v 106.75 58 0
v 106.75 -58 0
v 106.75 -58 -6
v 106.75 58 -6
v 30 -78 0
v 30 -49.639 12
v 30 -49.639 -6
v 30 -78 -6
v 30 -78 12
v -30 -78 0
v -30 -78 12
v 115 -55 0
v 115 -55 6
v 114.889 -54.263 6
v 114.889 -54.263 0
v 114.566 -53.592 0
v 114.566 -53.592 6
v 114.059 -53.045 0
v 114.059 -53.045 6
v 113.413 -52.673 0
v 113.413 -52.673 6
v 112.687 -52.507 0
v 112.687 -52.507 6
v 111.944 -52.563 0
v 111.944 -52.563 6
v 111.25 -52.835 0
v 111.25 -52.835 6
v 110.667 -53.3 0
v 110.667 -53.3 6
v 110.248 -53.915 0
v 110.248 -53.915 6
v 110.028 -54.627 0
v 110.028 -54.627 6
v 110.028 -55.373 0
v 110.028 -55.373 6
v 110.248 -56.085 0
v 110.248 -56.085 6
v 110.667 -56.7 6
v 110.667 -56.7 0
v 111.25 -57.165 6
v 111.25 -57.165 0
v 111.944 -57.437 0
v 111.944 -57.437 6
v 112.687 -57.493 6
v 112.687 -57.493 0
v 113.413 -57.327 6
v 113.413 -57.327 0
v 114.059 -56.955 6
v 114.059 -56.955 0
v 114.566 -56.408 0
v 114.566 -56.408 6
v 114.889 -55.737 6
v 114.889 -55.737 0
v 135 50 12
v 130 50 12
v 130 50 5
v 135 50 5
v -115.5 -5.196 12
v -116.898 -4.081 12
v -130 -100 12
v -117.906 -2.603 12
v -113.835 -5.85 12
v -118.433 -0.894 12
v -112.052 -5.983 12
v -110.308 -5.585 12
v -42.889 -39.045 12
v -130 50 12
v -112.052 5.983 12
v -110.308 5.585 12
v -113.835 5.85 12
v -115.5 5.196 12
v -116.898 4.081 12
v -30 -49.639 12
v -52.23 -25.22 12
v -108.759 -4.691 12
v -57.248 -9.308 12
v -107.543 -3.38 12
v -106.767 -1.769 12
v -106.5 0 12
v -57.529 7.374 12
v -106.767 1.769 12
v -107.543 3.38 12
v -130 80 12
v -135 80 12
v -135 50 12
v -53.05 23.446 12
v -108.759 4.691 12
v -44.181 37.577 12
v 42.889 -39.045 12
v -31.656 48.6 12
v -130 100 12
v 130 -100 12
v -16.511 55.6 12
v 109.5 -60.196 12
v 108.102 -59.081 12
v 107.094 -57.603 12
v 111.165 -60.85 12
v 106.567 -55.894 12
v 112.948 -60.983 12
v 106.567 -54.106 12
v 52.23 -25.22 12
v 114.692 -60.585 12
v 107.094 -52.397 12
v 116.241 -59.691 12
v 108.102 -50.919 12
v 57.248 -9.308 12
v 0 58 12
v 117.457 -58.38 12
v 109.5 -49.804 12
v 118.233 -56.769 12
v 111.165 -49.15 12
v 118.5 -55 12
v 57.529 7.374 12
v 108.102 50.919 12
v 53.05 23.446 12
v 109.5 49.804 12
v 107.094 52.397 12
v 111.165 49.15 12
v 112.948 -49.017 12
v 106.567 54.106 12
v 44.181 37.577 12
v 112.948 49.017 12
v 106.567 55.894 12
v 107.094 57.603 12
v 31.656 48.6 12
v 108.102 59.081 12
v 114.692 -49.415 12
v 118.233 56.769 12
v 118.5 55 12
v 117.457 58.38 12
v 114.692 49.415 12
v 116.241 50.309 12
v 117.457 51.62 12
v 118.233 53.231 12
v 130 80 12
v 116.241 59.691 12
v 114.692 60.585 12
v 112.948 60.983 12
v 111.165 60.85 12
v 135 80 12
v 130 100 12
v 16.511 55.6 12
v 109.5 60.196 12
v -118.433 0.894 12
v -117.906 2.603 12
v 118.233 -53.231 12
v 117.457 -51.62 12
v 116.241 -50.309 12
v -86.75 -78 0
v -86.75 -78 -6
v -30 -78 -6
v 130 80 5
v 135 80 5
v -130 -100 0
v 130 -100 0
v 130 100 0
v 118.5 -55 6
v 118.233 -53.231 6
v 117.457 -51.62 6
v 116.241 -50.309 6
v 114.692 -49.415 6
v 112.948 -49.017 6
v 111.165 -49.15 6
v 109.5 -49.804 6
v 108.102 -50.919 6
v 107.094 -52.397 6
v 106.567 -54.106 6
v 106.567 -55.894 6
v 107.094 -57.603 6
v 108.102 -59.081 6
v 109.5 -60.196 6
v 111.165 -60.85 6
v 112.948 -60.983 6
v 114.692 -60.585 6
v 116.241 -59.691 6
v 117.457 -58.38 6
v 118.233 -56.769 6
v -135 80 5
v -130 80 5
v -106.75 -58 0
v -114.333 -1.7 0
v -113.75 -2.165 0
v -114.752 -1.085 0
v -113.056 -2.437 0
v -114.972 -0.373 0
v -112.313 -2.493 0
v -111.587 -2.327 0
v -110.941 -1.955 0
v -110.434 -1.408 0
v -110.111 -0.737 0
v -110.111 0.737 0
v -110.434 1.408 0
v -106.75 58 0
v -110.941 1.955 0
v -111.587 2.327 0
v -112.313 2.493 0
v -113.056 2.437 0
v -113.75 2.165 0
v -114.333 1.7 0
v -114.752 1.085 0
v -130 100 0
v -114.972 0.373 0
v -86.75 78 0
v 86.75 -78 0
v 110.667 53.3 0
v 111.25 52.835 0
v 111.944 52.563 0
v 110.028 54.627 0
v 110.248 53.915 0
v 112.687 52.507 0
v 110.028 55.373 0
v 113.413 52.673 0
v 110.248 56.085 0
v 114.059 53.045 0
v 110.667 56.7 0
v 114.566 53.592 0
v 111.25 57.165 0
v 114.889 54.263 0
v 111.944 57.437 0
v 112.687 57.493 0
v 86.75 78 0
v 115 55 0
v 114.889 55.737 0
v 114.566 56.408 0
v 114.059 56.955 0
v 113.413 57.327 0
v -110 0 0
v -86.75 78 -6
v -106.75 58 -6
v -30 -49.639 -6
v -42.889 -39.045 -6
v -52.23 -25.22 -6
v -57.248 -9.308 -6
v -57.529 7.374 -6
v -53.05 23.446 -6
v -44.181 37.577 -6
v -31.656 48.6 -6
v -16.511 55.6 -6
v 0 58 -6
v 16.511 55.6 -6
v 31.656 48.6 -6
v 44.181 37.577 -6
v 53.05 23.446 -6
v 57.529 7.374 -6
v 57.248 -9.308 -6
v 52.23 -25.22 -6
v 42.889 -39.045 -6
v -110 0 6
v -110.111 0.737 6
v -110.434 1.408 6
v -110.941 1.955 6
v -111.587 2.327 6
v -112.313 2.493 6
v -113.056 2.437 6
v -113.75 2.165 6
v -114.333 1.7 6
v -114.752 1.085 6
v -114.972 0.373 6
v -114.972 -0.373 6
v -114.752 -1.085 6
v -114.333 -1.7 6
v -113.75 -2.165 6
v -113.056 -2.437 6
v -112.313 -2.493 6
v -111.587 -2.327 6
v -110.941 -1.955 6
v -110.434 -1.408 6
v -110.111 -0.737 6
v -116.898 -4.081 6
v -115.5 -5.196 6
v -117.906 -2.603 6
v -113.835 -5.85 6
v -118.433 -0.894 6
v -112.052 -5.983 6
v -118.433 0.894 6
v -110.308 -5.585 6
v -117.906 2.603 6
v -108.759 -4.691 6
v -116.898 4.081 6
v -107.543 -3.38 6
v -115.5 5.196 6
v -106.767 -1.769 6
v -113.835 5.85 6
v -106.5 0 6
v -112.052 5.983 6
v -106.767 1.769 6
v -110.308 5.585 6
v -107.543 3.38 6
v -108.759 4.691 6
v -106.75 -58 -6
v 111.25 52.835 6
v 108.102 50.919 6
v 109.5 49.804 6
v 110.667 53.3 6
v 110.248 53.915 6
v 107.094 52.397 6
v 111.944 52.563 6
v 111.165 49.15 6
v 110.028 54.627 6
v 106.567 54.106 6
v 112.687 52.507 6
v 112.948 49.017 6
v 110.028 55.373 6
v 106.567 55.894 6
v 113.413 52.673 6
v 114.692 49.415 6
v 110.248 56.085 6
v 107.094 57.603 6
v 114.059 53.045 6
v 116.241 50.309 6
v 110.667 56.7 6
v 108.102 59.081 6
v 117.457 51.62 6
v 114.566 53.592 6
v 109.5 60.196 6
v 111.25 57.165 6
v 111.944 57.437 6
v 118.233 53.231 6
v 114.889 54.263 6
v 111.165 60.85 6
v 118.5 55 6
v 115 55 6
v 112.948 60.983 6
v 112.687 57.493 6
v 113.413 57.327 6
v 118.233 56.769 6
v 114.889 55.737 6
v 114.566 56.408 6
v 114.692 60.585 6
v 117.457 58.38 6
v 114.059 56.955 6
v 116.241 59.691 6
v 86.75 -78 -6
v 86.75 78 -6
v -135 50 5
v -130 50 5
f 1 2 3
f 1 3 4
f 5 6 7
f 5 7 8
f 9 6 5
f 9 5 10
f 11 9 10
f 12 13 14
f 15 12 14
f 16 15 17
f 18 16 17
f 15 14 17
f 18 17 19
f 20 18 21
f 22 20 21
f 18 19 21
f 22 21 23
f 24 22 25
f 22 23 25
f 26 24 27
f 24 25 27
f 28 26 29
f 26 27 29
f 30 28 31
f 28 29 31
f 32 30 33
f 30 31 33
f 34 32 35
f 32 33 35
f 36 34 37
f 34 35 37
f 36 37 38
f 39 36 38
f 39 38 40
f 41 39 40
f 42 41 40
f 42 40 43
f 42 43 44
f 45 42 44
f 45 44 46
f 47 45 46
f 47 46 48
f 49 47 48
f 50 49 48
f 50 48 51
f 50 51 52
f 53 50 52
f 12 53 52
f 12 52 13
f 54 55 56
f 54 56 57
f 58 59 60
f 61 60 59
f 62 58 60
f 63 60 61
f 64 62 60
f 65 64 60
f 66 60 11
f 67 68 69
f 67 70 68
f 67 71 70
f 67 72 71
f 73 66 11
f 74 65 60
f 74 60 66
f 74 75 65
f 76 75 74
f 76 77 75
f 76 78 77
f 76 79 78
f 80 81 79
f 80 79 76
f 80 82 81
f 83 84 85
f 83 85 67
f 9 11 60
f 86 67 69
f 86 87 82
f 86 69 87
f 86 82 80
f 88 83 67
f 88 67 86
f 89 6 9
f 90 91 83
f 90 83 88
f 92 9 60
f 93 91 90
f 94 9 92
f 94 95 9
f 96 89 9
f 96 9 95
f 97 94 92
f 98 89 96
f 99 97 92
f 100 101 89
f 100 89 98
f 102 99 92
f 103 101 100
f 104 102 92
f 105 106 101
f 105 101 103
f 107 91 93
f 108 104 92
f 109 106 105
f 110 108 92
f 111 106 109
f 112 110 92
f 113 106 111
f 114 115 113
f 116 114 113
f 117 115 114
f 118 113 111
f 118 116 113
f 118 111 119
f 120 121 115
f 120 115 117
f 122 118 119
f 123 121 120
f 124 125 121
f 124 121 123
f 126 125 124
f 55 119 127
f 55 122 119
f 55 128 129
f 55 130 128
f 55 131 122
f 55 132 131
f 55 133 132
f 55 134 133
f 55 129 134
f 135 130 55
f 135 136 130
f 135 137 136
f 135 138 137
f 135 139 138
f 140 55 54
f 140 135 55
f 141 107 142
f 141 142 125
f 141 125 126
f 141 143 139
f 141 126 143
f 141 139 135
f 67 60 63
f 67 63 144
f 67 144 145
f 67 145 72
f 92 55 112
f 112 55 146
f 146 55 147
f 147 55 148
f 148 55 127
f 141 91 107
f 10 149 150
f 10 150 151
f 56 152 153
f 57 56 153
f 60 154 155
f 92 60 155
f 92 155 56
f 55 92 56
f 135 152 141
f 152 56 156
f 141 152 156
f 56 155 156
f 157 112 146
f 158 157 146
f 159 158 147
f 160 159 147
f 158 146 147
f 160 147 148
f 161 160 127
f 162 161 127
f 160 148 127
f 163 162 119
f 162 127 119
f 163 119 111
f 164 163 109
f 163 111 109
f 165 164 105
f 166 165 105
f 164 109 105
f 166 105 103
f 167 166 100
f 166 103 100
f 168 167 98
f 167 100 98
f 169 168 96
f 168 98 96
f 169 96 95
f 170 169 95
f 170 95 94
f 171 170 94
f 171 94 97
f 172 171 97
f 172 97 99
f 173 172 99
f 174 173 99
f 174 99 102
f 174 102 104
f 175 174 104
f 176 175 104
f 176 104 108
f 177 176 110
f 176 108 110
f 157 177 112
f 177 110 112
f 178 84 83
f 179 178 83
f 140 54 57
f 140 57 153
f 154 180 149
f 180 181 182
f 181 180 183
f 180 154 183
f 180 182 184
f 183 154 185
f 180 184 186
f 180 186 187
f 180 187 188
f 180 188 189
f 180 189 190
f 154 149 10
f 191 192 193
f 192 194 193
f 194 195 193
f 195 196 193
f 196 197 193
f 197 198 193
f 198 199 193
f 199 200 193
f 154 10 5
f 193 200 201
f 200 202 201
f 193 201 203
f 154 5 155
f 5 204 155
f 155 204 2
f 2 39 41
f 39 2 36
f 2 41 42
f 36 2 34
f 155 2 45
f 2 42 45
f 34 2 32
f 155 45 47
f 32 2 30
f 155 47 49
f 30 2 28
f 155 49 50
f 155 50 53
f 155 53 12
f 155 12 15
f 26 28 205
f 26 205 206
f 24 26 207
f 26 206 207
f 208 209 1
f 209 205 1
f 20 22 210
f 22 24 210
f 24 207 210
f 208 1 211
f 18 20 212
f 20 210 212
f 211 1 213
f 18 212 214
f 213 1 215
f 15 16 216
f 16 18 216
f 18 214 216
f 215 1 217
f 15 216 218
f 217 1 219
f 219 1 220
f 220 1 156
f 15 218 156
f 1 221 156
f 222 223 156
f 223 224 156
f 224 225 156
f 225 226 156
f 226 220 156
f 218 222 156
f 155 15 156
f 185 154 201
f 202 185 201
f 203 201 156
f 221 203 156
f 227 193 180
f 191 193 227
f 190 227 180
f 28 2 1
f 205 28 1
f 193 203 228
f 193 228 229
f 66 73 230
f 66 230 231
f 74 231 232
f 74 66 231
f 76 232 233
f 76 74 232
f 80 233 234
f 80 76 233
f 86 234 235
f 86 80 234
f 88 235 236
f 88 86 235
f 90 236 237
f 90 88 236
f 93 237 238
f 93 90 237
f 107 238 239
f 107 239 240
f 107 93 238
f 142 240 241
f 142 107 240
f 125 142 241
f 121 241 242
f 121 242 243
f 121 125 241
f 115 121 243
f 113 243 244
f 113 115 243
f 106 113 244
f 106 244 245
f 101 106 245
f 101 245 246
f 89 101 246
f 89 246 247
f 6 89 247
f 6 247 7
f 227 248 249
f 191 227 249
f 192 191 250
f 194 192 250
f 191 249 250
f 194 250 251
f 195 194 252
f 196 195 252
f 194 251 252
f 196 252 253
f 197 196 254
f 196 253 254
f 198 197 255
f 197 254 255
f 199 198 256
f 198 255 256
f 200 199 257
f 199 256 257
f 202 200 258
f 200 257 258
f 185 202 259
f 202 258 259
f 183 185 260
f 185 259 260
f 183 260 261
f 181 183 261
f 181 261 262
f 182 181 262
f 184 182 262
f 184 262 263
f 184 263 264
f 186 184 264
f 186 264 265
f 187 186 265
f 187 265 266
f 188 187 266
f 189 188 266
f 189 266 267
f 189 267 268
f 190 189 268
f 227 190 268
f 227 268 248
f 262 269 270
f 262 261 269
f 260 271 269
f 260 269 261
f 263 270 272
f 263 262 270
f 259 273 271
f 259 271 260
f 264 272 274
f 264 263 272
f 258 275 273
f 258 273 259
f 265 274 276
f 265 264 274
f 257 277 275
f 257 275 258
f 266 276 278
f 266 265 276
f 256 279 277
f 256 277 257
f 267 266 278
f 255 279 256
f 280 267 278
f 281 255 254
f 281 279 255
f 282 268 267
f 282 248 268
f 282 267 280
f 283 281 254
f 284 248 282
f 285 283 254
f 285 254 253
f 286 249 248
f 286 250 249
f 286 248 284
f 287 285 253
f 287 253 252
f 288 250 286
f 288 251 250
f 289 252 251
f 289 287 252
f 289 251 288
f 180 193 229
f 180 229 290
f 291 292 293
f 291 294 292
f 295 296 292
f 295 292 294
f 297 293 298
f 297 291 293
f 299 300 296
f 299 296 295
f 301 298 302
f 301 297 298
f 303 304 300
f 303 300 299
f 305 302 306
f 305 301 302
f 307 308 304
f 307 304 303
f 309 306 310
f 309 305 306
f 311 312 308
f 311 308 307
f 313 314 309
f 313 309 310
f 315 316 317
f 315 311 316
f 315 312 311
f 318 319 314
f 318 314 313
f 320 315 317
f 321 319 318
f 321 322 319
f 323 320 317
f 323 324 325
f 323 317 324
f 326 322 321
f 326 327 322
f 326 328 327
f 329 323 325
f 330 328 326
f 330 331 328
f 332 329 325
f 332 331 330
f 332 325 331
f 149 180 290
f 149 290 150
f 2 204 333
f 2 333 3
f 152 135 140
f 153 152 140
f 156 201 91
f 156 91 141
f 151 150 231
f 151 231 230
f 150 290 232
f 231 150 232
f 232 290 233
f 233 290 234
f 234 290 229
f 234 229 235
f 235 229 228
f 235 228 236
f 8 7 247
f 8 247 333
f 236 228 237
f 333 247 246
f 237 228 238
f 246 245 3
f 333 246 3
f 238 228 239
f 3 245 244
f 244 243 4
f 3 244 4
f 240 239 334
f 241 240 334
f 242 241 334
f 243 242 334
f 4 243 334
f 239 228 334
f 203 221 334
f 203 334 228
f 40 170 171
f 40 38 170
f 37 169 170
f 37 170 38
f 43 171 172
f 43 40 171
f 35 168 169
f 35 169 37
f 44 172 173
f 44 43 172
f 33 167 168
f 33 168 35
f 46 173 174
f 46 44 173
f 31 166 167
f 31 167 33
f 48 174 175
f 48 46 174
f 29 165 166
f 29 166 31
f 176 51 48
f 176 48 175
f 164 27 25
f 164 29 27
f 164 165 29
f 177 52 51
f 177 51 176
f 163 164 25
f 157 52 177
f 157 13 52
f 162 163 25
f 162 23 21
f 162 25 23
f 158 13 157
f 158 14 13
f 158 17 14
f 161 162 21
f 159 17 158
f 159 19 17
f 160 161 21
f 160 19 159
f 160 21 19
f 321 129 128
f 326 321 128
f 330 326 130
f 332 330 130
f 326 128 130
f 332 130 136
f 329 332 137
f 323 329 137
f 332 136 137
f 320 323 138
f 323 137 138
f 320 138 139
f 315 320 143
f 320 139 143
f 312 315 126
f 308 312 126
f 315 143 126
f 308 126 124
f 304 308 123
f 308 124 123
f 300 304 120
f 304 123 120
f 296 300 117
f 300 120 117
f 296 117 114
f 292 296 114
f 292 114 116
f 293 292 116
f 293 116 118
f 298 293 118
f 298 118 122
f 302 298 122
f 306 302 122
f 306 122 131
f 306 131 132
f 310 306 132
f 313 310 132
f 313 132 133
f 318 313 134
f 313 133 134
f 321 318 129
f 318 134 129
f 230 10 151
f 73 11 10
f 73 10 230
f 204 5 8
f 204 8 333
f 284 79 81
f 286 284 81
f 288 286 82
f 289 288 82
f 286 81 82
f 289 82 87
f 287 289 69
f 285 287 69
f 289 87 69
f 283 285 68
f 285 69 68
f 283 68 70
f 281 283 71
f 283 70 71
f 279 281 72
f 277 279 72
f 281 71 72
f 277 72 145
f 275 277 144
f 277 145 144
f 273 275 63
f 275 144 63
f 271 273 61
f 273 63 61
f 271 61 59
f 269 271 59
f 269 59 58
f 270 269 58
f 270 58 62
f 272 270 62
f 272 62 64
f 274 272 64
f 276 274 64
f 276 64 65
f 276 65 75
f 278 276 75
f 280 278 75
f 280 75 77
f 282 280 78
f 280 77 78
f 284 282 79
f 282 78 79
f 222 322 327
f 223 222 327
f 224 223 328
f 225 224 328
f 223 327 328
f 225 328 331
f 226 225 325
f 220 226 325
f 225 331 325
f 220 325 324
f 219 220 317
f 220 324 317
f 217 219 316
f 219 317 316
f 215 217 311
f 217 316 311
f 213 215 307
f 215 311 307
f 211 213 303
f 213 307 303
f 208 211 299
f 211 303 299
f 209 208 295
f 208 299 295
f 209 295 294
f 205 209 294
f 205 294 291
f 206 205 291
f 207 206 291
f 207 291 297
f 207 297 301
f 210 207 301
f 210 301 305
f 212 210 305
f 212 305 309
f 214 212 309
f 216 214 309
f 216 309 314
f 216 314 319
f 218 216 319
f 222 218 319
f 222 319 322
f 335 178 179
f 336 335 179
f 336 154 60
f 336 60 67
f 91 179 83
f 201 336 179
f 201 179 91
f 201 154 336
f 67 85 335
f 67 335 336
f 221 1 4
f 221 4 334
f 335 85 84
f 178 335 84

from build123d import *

# Parameters (mm, degrees)
F0_W     = 260
F0_H     = 200
F1_DEPTH = 12
F2_DEPTH = 6
F3_W     = 5
F3_H     = 30
F4_DEPTH = 7
F5_R     = 6
F5_R_2   = 2.5
F6_DEPTH = 6
F7_DEPTH = 18.001


with BuildPart() as f1:
    # F0 (on Top) → F1 (new body)
    with BuildSketch(Plane.XY):
        Rectangle(F0_W, F0_H)
        Polygon((-86.75, 78), (86.75, 78), (106.75, 58), (106.75, -58), (86.75, -78), (30, -78), (-30, -78), (-86.75, -78), (-106.75, -58), (-106.75, 58), align=None, mode=Mode.SUBTRACT)
        with BuildLine():
            Line((106.75, 58), (86.75, 78))
            Line((86.75, 78), (-86.75, 78))
            Line((-86.75, 78), (-106.75, 58))
            Line((-106.75, 58), (-106.75, -58))
            Line((-106.75, -58), (-86.75, -78))
            Line((-86.75, -78), (-30, -78))
            Line((-30, -78), (-30, -49.638695))
            ThreePointArc((-30, -49.638695), (0, 58), (30, -49.638695))
            Line((30, -49.638695), (30, -78))
            Line((30, -78), (86.75, -78))
            Line((86.75, -78), (106.75, -58))
            Line((106.75, -58), (106.75, 58))
        make_face()
    extrude(amount=F1_DEPTH)

    # F0 (on Top) → F2 (join)
    with BuildSketch(Plane.XY):
        with BuildLine():
            Line((106.75, 58), (86.75, 78))
            Line((86.75, 78), (-86.75, 78))
            Line((-86.75, 78), (-106.75, 58))
            Line((-106.75, 58), (-106.75, -58))
            Line((-106.75, -58), (-86.75, -78))
            Line((-86.75, -78), (-30, -78))
            Line((-30, -78), (-30, -49.638695))
            ThreePointArc((-30, -49.638695), (0, 58), (30, -49.638695))
            Line((30, -49.638695), (30, -78))
            Line((30, -78), (86.75, -78))
            Line((86.75, -78), (106.75, -58))
            Line((106.75, -58), (106.75, 58))
        make_face()
    extrude(amount=-F2_DEPTH)

    # F3 (on face) → F4 (join)
    with BuildSketch(Plane.XY.offset(12)):
        with Locations((-132.5, 65)):
            Rectangle(F3_W, F3_H)
        with Locations((132.5, 65)):
            Rectangle(F3_W, F3_H)
    extrude(amount=-F4_DEPTH)

    # F5 (on face) → F6 (cut)
    with BuildSketch(Plane.XY.offset(12)):
        with Locations((-112.5, 0)):
            Circle(F5_R)
        with Locations((-112.5, 0)):
            Circle(F5_R_2, mode=Mode.SUBTRACT)
        with Locations((-112.5, 0)):
            Circle(F5_R_2)
        with Locations((112.5, 55)):
            Circle(F5_R)
        with Locations((112.5, 55)):
            Circle(F5_R_2, mode=Mode.SUBTRACT)
        with Locations((112.5, 55)):
            Circle(F5_R_2)
        with Locations((112.5, -55)):
            Circle(F5_R_2)
        with Locations((112.5, -55)):
            Circle(F5_R)
        with Locations((112.5, -55)):
            Circle(F5_R_2, mode=Mode.SUBTRACT)
    extrude(amount=-F6_DEPTH, mode=Mode.SUBTRACT)

    # F5 (on face) → F7 (cut, through all)
    with BuildSketch(Plane.XY.offset(12)):
        with Locations((-112.5, 0)):
            Circle(F5_R_2)
        with Locations((112.5, 55)):
            Circle(F5_R_2)
        with Locations((112.5, -55)):
            Circle(F5_R_2)
    extrude(amount=-F7_DEPTH, mode=Mode.SUBTRACT)


solid = f1.part
